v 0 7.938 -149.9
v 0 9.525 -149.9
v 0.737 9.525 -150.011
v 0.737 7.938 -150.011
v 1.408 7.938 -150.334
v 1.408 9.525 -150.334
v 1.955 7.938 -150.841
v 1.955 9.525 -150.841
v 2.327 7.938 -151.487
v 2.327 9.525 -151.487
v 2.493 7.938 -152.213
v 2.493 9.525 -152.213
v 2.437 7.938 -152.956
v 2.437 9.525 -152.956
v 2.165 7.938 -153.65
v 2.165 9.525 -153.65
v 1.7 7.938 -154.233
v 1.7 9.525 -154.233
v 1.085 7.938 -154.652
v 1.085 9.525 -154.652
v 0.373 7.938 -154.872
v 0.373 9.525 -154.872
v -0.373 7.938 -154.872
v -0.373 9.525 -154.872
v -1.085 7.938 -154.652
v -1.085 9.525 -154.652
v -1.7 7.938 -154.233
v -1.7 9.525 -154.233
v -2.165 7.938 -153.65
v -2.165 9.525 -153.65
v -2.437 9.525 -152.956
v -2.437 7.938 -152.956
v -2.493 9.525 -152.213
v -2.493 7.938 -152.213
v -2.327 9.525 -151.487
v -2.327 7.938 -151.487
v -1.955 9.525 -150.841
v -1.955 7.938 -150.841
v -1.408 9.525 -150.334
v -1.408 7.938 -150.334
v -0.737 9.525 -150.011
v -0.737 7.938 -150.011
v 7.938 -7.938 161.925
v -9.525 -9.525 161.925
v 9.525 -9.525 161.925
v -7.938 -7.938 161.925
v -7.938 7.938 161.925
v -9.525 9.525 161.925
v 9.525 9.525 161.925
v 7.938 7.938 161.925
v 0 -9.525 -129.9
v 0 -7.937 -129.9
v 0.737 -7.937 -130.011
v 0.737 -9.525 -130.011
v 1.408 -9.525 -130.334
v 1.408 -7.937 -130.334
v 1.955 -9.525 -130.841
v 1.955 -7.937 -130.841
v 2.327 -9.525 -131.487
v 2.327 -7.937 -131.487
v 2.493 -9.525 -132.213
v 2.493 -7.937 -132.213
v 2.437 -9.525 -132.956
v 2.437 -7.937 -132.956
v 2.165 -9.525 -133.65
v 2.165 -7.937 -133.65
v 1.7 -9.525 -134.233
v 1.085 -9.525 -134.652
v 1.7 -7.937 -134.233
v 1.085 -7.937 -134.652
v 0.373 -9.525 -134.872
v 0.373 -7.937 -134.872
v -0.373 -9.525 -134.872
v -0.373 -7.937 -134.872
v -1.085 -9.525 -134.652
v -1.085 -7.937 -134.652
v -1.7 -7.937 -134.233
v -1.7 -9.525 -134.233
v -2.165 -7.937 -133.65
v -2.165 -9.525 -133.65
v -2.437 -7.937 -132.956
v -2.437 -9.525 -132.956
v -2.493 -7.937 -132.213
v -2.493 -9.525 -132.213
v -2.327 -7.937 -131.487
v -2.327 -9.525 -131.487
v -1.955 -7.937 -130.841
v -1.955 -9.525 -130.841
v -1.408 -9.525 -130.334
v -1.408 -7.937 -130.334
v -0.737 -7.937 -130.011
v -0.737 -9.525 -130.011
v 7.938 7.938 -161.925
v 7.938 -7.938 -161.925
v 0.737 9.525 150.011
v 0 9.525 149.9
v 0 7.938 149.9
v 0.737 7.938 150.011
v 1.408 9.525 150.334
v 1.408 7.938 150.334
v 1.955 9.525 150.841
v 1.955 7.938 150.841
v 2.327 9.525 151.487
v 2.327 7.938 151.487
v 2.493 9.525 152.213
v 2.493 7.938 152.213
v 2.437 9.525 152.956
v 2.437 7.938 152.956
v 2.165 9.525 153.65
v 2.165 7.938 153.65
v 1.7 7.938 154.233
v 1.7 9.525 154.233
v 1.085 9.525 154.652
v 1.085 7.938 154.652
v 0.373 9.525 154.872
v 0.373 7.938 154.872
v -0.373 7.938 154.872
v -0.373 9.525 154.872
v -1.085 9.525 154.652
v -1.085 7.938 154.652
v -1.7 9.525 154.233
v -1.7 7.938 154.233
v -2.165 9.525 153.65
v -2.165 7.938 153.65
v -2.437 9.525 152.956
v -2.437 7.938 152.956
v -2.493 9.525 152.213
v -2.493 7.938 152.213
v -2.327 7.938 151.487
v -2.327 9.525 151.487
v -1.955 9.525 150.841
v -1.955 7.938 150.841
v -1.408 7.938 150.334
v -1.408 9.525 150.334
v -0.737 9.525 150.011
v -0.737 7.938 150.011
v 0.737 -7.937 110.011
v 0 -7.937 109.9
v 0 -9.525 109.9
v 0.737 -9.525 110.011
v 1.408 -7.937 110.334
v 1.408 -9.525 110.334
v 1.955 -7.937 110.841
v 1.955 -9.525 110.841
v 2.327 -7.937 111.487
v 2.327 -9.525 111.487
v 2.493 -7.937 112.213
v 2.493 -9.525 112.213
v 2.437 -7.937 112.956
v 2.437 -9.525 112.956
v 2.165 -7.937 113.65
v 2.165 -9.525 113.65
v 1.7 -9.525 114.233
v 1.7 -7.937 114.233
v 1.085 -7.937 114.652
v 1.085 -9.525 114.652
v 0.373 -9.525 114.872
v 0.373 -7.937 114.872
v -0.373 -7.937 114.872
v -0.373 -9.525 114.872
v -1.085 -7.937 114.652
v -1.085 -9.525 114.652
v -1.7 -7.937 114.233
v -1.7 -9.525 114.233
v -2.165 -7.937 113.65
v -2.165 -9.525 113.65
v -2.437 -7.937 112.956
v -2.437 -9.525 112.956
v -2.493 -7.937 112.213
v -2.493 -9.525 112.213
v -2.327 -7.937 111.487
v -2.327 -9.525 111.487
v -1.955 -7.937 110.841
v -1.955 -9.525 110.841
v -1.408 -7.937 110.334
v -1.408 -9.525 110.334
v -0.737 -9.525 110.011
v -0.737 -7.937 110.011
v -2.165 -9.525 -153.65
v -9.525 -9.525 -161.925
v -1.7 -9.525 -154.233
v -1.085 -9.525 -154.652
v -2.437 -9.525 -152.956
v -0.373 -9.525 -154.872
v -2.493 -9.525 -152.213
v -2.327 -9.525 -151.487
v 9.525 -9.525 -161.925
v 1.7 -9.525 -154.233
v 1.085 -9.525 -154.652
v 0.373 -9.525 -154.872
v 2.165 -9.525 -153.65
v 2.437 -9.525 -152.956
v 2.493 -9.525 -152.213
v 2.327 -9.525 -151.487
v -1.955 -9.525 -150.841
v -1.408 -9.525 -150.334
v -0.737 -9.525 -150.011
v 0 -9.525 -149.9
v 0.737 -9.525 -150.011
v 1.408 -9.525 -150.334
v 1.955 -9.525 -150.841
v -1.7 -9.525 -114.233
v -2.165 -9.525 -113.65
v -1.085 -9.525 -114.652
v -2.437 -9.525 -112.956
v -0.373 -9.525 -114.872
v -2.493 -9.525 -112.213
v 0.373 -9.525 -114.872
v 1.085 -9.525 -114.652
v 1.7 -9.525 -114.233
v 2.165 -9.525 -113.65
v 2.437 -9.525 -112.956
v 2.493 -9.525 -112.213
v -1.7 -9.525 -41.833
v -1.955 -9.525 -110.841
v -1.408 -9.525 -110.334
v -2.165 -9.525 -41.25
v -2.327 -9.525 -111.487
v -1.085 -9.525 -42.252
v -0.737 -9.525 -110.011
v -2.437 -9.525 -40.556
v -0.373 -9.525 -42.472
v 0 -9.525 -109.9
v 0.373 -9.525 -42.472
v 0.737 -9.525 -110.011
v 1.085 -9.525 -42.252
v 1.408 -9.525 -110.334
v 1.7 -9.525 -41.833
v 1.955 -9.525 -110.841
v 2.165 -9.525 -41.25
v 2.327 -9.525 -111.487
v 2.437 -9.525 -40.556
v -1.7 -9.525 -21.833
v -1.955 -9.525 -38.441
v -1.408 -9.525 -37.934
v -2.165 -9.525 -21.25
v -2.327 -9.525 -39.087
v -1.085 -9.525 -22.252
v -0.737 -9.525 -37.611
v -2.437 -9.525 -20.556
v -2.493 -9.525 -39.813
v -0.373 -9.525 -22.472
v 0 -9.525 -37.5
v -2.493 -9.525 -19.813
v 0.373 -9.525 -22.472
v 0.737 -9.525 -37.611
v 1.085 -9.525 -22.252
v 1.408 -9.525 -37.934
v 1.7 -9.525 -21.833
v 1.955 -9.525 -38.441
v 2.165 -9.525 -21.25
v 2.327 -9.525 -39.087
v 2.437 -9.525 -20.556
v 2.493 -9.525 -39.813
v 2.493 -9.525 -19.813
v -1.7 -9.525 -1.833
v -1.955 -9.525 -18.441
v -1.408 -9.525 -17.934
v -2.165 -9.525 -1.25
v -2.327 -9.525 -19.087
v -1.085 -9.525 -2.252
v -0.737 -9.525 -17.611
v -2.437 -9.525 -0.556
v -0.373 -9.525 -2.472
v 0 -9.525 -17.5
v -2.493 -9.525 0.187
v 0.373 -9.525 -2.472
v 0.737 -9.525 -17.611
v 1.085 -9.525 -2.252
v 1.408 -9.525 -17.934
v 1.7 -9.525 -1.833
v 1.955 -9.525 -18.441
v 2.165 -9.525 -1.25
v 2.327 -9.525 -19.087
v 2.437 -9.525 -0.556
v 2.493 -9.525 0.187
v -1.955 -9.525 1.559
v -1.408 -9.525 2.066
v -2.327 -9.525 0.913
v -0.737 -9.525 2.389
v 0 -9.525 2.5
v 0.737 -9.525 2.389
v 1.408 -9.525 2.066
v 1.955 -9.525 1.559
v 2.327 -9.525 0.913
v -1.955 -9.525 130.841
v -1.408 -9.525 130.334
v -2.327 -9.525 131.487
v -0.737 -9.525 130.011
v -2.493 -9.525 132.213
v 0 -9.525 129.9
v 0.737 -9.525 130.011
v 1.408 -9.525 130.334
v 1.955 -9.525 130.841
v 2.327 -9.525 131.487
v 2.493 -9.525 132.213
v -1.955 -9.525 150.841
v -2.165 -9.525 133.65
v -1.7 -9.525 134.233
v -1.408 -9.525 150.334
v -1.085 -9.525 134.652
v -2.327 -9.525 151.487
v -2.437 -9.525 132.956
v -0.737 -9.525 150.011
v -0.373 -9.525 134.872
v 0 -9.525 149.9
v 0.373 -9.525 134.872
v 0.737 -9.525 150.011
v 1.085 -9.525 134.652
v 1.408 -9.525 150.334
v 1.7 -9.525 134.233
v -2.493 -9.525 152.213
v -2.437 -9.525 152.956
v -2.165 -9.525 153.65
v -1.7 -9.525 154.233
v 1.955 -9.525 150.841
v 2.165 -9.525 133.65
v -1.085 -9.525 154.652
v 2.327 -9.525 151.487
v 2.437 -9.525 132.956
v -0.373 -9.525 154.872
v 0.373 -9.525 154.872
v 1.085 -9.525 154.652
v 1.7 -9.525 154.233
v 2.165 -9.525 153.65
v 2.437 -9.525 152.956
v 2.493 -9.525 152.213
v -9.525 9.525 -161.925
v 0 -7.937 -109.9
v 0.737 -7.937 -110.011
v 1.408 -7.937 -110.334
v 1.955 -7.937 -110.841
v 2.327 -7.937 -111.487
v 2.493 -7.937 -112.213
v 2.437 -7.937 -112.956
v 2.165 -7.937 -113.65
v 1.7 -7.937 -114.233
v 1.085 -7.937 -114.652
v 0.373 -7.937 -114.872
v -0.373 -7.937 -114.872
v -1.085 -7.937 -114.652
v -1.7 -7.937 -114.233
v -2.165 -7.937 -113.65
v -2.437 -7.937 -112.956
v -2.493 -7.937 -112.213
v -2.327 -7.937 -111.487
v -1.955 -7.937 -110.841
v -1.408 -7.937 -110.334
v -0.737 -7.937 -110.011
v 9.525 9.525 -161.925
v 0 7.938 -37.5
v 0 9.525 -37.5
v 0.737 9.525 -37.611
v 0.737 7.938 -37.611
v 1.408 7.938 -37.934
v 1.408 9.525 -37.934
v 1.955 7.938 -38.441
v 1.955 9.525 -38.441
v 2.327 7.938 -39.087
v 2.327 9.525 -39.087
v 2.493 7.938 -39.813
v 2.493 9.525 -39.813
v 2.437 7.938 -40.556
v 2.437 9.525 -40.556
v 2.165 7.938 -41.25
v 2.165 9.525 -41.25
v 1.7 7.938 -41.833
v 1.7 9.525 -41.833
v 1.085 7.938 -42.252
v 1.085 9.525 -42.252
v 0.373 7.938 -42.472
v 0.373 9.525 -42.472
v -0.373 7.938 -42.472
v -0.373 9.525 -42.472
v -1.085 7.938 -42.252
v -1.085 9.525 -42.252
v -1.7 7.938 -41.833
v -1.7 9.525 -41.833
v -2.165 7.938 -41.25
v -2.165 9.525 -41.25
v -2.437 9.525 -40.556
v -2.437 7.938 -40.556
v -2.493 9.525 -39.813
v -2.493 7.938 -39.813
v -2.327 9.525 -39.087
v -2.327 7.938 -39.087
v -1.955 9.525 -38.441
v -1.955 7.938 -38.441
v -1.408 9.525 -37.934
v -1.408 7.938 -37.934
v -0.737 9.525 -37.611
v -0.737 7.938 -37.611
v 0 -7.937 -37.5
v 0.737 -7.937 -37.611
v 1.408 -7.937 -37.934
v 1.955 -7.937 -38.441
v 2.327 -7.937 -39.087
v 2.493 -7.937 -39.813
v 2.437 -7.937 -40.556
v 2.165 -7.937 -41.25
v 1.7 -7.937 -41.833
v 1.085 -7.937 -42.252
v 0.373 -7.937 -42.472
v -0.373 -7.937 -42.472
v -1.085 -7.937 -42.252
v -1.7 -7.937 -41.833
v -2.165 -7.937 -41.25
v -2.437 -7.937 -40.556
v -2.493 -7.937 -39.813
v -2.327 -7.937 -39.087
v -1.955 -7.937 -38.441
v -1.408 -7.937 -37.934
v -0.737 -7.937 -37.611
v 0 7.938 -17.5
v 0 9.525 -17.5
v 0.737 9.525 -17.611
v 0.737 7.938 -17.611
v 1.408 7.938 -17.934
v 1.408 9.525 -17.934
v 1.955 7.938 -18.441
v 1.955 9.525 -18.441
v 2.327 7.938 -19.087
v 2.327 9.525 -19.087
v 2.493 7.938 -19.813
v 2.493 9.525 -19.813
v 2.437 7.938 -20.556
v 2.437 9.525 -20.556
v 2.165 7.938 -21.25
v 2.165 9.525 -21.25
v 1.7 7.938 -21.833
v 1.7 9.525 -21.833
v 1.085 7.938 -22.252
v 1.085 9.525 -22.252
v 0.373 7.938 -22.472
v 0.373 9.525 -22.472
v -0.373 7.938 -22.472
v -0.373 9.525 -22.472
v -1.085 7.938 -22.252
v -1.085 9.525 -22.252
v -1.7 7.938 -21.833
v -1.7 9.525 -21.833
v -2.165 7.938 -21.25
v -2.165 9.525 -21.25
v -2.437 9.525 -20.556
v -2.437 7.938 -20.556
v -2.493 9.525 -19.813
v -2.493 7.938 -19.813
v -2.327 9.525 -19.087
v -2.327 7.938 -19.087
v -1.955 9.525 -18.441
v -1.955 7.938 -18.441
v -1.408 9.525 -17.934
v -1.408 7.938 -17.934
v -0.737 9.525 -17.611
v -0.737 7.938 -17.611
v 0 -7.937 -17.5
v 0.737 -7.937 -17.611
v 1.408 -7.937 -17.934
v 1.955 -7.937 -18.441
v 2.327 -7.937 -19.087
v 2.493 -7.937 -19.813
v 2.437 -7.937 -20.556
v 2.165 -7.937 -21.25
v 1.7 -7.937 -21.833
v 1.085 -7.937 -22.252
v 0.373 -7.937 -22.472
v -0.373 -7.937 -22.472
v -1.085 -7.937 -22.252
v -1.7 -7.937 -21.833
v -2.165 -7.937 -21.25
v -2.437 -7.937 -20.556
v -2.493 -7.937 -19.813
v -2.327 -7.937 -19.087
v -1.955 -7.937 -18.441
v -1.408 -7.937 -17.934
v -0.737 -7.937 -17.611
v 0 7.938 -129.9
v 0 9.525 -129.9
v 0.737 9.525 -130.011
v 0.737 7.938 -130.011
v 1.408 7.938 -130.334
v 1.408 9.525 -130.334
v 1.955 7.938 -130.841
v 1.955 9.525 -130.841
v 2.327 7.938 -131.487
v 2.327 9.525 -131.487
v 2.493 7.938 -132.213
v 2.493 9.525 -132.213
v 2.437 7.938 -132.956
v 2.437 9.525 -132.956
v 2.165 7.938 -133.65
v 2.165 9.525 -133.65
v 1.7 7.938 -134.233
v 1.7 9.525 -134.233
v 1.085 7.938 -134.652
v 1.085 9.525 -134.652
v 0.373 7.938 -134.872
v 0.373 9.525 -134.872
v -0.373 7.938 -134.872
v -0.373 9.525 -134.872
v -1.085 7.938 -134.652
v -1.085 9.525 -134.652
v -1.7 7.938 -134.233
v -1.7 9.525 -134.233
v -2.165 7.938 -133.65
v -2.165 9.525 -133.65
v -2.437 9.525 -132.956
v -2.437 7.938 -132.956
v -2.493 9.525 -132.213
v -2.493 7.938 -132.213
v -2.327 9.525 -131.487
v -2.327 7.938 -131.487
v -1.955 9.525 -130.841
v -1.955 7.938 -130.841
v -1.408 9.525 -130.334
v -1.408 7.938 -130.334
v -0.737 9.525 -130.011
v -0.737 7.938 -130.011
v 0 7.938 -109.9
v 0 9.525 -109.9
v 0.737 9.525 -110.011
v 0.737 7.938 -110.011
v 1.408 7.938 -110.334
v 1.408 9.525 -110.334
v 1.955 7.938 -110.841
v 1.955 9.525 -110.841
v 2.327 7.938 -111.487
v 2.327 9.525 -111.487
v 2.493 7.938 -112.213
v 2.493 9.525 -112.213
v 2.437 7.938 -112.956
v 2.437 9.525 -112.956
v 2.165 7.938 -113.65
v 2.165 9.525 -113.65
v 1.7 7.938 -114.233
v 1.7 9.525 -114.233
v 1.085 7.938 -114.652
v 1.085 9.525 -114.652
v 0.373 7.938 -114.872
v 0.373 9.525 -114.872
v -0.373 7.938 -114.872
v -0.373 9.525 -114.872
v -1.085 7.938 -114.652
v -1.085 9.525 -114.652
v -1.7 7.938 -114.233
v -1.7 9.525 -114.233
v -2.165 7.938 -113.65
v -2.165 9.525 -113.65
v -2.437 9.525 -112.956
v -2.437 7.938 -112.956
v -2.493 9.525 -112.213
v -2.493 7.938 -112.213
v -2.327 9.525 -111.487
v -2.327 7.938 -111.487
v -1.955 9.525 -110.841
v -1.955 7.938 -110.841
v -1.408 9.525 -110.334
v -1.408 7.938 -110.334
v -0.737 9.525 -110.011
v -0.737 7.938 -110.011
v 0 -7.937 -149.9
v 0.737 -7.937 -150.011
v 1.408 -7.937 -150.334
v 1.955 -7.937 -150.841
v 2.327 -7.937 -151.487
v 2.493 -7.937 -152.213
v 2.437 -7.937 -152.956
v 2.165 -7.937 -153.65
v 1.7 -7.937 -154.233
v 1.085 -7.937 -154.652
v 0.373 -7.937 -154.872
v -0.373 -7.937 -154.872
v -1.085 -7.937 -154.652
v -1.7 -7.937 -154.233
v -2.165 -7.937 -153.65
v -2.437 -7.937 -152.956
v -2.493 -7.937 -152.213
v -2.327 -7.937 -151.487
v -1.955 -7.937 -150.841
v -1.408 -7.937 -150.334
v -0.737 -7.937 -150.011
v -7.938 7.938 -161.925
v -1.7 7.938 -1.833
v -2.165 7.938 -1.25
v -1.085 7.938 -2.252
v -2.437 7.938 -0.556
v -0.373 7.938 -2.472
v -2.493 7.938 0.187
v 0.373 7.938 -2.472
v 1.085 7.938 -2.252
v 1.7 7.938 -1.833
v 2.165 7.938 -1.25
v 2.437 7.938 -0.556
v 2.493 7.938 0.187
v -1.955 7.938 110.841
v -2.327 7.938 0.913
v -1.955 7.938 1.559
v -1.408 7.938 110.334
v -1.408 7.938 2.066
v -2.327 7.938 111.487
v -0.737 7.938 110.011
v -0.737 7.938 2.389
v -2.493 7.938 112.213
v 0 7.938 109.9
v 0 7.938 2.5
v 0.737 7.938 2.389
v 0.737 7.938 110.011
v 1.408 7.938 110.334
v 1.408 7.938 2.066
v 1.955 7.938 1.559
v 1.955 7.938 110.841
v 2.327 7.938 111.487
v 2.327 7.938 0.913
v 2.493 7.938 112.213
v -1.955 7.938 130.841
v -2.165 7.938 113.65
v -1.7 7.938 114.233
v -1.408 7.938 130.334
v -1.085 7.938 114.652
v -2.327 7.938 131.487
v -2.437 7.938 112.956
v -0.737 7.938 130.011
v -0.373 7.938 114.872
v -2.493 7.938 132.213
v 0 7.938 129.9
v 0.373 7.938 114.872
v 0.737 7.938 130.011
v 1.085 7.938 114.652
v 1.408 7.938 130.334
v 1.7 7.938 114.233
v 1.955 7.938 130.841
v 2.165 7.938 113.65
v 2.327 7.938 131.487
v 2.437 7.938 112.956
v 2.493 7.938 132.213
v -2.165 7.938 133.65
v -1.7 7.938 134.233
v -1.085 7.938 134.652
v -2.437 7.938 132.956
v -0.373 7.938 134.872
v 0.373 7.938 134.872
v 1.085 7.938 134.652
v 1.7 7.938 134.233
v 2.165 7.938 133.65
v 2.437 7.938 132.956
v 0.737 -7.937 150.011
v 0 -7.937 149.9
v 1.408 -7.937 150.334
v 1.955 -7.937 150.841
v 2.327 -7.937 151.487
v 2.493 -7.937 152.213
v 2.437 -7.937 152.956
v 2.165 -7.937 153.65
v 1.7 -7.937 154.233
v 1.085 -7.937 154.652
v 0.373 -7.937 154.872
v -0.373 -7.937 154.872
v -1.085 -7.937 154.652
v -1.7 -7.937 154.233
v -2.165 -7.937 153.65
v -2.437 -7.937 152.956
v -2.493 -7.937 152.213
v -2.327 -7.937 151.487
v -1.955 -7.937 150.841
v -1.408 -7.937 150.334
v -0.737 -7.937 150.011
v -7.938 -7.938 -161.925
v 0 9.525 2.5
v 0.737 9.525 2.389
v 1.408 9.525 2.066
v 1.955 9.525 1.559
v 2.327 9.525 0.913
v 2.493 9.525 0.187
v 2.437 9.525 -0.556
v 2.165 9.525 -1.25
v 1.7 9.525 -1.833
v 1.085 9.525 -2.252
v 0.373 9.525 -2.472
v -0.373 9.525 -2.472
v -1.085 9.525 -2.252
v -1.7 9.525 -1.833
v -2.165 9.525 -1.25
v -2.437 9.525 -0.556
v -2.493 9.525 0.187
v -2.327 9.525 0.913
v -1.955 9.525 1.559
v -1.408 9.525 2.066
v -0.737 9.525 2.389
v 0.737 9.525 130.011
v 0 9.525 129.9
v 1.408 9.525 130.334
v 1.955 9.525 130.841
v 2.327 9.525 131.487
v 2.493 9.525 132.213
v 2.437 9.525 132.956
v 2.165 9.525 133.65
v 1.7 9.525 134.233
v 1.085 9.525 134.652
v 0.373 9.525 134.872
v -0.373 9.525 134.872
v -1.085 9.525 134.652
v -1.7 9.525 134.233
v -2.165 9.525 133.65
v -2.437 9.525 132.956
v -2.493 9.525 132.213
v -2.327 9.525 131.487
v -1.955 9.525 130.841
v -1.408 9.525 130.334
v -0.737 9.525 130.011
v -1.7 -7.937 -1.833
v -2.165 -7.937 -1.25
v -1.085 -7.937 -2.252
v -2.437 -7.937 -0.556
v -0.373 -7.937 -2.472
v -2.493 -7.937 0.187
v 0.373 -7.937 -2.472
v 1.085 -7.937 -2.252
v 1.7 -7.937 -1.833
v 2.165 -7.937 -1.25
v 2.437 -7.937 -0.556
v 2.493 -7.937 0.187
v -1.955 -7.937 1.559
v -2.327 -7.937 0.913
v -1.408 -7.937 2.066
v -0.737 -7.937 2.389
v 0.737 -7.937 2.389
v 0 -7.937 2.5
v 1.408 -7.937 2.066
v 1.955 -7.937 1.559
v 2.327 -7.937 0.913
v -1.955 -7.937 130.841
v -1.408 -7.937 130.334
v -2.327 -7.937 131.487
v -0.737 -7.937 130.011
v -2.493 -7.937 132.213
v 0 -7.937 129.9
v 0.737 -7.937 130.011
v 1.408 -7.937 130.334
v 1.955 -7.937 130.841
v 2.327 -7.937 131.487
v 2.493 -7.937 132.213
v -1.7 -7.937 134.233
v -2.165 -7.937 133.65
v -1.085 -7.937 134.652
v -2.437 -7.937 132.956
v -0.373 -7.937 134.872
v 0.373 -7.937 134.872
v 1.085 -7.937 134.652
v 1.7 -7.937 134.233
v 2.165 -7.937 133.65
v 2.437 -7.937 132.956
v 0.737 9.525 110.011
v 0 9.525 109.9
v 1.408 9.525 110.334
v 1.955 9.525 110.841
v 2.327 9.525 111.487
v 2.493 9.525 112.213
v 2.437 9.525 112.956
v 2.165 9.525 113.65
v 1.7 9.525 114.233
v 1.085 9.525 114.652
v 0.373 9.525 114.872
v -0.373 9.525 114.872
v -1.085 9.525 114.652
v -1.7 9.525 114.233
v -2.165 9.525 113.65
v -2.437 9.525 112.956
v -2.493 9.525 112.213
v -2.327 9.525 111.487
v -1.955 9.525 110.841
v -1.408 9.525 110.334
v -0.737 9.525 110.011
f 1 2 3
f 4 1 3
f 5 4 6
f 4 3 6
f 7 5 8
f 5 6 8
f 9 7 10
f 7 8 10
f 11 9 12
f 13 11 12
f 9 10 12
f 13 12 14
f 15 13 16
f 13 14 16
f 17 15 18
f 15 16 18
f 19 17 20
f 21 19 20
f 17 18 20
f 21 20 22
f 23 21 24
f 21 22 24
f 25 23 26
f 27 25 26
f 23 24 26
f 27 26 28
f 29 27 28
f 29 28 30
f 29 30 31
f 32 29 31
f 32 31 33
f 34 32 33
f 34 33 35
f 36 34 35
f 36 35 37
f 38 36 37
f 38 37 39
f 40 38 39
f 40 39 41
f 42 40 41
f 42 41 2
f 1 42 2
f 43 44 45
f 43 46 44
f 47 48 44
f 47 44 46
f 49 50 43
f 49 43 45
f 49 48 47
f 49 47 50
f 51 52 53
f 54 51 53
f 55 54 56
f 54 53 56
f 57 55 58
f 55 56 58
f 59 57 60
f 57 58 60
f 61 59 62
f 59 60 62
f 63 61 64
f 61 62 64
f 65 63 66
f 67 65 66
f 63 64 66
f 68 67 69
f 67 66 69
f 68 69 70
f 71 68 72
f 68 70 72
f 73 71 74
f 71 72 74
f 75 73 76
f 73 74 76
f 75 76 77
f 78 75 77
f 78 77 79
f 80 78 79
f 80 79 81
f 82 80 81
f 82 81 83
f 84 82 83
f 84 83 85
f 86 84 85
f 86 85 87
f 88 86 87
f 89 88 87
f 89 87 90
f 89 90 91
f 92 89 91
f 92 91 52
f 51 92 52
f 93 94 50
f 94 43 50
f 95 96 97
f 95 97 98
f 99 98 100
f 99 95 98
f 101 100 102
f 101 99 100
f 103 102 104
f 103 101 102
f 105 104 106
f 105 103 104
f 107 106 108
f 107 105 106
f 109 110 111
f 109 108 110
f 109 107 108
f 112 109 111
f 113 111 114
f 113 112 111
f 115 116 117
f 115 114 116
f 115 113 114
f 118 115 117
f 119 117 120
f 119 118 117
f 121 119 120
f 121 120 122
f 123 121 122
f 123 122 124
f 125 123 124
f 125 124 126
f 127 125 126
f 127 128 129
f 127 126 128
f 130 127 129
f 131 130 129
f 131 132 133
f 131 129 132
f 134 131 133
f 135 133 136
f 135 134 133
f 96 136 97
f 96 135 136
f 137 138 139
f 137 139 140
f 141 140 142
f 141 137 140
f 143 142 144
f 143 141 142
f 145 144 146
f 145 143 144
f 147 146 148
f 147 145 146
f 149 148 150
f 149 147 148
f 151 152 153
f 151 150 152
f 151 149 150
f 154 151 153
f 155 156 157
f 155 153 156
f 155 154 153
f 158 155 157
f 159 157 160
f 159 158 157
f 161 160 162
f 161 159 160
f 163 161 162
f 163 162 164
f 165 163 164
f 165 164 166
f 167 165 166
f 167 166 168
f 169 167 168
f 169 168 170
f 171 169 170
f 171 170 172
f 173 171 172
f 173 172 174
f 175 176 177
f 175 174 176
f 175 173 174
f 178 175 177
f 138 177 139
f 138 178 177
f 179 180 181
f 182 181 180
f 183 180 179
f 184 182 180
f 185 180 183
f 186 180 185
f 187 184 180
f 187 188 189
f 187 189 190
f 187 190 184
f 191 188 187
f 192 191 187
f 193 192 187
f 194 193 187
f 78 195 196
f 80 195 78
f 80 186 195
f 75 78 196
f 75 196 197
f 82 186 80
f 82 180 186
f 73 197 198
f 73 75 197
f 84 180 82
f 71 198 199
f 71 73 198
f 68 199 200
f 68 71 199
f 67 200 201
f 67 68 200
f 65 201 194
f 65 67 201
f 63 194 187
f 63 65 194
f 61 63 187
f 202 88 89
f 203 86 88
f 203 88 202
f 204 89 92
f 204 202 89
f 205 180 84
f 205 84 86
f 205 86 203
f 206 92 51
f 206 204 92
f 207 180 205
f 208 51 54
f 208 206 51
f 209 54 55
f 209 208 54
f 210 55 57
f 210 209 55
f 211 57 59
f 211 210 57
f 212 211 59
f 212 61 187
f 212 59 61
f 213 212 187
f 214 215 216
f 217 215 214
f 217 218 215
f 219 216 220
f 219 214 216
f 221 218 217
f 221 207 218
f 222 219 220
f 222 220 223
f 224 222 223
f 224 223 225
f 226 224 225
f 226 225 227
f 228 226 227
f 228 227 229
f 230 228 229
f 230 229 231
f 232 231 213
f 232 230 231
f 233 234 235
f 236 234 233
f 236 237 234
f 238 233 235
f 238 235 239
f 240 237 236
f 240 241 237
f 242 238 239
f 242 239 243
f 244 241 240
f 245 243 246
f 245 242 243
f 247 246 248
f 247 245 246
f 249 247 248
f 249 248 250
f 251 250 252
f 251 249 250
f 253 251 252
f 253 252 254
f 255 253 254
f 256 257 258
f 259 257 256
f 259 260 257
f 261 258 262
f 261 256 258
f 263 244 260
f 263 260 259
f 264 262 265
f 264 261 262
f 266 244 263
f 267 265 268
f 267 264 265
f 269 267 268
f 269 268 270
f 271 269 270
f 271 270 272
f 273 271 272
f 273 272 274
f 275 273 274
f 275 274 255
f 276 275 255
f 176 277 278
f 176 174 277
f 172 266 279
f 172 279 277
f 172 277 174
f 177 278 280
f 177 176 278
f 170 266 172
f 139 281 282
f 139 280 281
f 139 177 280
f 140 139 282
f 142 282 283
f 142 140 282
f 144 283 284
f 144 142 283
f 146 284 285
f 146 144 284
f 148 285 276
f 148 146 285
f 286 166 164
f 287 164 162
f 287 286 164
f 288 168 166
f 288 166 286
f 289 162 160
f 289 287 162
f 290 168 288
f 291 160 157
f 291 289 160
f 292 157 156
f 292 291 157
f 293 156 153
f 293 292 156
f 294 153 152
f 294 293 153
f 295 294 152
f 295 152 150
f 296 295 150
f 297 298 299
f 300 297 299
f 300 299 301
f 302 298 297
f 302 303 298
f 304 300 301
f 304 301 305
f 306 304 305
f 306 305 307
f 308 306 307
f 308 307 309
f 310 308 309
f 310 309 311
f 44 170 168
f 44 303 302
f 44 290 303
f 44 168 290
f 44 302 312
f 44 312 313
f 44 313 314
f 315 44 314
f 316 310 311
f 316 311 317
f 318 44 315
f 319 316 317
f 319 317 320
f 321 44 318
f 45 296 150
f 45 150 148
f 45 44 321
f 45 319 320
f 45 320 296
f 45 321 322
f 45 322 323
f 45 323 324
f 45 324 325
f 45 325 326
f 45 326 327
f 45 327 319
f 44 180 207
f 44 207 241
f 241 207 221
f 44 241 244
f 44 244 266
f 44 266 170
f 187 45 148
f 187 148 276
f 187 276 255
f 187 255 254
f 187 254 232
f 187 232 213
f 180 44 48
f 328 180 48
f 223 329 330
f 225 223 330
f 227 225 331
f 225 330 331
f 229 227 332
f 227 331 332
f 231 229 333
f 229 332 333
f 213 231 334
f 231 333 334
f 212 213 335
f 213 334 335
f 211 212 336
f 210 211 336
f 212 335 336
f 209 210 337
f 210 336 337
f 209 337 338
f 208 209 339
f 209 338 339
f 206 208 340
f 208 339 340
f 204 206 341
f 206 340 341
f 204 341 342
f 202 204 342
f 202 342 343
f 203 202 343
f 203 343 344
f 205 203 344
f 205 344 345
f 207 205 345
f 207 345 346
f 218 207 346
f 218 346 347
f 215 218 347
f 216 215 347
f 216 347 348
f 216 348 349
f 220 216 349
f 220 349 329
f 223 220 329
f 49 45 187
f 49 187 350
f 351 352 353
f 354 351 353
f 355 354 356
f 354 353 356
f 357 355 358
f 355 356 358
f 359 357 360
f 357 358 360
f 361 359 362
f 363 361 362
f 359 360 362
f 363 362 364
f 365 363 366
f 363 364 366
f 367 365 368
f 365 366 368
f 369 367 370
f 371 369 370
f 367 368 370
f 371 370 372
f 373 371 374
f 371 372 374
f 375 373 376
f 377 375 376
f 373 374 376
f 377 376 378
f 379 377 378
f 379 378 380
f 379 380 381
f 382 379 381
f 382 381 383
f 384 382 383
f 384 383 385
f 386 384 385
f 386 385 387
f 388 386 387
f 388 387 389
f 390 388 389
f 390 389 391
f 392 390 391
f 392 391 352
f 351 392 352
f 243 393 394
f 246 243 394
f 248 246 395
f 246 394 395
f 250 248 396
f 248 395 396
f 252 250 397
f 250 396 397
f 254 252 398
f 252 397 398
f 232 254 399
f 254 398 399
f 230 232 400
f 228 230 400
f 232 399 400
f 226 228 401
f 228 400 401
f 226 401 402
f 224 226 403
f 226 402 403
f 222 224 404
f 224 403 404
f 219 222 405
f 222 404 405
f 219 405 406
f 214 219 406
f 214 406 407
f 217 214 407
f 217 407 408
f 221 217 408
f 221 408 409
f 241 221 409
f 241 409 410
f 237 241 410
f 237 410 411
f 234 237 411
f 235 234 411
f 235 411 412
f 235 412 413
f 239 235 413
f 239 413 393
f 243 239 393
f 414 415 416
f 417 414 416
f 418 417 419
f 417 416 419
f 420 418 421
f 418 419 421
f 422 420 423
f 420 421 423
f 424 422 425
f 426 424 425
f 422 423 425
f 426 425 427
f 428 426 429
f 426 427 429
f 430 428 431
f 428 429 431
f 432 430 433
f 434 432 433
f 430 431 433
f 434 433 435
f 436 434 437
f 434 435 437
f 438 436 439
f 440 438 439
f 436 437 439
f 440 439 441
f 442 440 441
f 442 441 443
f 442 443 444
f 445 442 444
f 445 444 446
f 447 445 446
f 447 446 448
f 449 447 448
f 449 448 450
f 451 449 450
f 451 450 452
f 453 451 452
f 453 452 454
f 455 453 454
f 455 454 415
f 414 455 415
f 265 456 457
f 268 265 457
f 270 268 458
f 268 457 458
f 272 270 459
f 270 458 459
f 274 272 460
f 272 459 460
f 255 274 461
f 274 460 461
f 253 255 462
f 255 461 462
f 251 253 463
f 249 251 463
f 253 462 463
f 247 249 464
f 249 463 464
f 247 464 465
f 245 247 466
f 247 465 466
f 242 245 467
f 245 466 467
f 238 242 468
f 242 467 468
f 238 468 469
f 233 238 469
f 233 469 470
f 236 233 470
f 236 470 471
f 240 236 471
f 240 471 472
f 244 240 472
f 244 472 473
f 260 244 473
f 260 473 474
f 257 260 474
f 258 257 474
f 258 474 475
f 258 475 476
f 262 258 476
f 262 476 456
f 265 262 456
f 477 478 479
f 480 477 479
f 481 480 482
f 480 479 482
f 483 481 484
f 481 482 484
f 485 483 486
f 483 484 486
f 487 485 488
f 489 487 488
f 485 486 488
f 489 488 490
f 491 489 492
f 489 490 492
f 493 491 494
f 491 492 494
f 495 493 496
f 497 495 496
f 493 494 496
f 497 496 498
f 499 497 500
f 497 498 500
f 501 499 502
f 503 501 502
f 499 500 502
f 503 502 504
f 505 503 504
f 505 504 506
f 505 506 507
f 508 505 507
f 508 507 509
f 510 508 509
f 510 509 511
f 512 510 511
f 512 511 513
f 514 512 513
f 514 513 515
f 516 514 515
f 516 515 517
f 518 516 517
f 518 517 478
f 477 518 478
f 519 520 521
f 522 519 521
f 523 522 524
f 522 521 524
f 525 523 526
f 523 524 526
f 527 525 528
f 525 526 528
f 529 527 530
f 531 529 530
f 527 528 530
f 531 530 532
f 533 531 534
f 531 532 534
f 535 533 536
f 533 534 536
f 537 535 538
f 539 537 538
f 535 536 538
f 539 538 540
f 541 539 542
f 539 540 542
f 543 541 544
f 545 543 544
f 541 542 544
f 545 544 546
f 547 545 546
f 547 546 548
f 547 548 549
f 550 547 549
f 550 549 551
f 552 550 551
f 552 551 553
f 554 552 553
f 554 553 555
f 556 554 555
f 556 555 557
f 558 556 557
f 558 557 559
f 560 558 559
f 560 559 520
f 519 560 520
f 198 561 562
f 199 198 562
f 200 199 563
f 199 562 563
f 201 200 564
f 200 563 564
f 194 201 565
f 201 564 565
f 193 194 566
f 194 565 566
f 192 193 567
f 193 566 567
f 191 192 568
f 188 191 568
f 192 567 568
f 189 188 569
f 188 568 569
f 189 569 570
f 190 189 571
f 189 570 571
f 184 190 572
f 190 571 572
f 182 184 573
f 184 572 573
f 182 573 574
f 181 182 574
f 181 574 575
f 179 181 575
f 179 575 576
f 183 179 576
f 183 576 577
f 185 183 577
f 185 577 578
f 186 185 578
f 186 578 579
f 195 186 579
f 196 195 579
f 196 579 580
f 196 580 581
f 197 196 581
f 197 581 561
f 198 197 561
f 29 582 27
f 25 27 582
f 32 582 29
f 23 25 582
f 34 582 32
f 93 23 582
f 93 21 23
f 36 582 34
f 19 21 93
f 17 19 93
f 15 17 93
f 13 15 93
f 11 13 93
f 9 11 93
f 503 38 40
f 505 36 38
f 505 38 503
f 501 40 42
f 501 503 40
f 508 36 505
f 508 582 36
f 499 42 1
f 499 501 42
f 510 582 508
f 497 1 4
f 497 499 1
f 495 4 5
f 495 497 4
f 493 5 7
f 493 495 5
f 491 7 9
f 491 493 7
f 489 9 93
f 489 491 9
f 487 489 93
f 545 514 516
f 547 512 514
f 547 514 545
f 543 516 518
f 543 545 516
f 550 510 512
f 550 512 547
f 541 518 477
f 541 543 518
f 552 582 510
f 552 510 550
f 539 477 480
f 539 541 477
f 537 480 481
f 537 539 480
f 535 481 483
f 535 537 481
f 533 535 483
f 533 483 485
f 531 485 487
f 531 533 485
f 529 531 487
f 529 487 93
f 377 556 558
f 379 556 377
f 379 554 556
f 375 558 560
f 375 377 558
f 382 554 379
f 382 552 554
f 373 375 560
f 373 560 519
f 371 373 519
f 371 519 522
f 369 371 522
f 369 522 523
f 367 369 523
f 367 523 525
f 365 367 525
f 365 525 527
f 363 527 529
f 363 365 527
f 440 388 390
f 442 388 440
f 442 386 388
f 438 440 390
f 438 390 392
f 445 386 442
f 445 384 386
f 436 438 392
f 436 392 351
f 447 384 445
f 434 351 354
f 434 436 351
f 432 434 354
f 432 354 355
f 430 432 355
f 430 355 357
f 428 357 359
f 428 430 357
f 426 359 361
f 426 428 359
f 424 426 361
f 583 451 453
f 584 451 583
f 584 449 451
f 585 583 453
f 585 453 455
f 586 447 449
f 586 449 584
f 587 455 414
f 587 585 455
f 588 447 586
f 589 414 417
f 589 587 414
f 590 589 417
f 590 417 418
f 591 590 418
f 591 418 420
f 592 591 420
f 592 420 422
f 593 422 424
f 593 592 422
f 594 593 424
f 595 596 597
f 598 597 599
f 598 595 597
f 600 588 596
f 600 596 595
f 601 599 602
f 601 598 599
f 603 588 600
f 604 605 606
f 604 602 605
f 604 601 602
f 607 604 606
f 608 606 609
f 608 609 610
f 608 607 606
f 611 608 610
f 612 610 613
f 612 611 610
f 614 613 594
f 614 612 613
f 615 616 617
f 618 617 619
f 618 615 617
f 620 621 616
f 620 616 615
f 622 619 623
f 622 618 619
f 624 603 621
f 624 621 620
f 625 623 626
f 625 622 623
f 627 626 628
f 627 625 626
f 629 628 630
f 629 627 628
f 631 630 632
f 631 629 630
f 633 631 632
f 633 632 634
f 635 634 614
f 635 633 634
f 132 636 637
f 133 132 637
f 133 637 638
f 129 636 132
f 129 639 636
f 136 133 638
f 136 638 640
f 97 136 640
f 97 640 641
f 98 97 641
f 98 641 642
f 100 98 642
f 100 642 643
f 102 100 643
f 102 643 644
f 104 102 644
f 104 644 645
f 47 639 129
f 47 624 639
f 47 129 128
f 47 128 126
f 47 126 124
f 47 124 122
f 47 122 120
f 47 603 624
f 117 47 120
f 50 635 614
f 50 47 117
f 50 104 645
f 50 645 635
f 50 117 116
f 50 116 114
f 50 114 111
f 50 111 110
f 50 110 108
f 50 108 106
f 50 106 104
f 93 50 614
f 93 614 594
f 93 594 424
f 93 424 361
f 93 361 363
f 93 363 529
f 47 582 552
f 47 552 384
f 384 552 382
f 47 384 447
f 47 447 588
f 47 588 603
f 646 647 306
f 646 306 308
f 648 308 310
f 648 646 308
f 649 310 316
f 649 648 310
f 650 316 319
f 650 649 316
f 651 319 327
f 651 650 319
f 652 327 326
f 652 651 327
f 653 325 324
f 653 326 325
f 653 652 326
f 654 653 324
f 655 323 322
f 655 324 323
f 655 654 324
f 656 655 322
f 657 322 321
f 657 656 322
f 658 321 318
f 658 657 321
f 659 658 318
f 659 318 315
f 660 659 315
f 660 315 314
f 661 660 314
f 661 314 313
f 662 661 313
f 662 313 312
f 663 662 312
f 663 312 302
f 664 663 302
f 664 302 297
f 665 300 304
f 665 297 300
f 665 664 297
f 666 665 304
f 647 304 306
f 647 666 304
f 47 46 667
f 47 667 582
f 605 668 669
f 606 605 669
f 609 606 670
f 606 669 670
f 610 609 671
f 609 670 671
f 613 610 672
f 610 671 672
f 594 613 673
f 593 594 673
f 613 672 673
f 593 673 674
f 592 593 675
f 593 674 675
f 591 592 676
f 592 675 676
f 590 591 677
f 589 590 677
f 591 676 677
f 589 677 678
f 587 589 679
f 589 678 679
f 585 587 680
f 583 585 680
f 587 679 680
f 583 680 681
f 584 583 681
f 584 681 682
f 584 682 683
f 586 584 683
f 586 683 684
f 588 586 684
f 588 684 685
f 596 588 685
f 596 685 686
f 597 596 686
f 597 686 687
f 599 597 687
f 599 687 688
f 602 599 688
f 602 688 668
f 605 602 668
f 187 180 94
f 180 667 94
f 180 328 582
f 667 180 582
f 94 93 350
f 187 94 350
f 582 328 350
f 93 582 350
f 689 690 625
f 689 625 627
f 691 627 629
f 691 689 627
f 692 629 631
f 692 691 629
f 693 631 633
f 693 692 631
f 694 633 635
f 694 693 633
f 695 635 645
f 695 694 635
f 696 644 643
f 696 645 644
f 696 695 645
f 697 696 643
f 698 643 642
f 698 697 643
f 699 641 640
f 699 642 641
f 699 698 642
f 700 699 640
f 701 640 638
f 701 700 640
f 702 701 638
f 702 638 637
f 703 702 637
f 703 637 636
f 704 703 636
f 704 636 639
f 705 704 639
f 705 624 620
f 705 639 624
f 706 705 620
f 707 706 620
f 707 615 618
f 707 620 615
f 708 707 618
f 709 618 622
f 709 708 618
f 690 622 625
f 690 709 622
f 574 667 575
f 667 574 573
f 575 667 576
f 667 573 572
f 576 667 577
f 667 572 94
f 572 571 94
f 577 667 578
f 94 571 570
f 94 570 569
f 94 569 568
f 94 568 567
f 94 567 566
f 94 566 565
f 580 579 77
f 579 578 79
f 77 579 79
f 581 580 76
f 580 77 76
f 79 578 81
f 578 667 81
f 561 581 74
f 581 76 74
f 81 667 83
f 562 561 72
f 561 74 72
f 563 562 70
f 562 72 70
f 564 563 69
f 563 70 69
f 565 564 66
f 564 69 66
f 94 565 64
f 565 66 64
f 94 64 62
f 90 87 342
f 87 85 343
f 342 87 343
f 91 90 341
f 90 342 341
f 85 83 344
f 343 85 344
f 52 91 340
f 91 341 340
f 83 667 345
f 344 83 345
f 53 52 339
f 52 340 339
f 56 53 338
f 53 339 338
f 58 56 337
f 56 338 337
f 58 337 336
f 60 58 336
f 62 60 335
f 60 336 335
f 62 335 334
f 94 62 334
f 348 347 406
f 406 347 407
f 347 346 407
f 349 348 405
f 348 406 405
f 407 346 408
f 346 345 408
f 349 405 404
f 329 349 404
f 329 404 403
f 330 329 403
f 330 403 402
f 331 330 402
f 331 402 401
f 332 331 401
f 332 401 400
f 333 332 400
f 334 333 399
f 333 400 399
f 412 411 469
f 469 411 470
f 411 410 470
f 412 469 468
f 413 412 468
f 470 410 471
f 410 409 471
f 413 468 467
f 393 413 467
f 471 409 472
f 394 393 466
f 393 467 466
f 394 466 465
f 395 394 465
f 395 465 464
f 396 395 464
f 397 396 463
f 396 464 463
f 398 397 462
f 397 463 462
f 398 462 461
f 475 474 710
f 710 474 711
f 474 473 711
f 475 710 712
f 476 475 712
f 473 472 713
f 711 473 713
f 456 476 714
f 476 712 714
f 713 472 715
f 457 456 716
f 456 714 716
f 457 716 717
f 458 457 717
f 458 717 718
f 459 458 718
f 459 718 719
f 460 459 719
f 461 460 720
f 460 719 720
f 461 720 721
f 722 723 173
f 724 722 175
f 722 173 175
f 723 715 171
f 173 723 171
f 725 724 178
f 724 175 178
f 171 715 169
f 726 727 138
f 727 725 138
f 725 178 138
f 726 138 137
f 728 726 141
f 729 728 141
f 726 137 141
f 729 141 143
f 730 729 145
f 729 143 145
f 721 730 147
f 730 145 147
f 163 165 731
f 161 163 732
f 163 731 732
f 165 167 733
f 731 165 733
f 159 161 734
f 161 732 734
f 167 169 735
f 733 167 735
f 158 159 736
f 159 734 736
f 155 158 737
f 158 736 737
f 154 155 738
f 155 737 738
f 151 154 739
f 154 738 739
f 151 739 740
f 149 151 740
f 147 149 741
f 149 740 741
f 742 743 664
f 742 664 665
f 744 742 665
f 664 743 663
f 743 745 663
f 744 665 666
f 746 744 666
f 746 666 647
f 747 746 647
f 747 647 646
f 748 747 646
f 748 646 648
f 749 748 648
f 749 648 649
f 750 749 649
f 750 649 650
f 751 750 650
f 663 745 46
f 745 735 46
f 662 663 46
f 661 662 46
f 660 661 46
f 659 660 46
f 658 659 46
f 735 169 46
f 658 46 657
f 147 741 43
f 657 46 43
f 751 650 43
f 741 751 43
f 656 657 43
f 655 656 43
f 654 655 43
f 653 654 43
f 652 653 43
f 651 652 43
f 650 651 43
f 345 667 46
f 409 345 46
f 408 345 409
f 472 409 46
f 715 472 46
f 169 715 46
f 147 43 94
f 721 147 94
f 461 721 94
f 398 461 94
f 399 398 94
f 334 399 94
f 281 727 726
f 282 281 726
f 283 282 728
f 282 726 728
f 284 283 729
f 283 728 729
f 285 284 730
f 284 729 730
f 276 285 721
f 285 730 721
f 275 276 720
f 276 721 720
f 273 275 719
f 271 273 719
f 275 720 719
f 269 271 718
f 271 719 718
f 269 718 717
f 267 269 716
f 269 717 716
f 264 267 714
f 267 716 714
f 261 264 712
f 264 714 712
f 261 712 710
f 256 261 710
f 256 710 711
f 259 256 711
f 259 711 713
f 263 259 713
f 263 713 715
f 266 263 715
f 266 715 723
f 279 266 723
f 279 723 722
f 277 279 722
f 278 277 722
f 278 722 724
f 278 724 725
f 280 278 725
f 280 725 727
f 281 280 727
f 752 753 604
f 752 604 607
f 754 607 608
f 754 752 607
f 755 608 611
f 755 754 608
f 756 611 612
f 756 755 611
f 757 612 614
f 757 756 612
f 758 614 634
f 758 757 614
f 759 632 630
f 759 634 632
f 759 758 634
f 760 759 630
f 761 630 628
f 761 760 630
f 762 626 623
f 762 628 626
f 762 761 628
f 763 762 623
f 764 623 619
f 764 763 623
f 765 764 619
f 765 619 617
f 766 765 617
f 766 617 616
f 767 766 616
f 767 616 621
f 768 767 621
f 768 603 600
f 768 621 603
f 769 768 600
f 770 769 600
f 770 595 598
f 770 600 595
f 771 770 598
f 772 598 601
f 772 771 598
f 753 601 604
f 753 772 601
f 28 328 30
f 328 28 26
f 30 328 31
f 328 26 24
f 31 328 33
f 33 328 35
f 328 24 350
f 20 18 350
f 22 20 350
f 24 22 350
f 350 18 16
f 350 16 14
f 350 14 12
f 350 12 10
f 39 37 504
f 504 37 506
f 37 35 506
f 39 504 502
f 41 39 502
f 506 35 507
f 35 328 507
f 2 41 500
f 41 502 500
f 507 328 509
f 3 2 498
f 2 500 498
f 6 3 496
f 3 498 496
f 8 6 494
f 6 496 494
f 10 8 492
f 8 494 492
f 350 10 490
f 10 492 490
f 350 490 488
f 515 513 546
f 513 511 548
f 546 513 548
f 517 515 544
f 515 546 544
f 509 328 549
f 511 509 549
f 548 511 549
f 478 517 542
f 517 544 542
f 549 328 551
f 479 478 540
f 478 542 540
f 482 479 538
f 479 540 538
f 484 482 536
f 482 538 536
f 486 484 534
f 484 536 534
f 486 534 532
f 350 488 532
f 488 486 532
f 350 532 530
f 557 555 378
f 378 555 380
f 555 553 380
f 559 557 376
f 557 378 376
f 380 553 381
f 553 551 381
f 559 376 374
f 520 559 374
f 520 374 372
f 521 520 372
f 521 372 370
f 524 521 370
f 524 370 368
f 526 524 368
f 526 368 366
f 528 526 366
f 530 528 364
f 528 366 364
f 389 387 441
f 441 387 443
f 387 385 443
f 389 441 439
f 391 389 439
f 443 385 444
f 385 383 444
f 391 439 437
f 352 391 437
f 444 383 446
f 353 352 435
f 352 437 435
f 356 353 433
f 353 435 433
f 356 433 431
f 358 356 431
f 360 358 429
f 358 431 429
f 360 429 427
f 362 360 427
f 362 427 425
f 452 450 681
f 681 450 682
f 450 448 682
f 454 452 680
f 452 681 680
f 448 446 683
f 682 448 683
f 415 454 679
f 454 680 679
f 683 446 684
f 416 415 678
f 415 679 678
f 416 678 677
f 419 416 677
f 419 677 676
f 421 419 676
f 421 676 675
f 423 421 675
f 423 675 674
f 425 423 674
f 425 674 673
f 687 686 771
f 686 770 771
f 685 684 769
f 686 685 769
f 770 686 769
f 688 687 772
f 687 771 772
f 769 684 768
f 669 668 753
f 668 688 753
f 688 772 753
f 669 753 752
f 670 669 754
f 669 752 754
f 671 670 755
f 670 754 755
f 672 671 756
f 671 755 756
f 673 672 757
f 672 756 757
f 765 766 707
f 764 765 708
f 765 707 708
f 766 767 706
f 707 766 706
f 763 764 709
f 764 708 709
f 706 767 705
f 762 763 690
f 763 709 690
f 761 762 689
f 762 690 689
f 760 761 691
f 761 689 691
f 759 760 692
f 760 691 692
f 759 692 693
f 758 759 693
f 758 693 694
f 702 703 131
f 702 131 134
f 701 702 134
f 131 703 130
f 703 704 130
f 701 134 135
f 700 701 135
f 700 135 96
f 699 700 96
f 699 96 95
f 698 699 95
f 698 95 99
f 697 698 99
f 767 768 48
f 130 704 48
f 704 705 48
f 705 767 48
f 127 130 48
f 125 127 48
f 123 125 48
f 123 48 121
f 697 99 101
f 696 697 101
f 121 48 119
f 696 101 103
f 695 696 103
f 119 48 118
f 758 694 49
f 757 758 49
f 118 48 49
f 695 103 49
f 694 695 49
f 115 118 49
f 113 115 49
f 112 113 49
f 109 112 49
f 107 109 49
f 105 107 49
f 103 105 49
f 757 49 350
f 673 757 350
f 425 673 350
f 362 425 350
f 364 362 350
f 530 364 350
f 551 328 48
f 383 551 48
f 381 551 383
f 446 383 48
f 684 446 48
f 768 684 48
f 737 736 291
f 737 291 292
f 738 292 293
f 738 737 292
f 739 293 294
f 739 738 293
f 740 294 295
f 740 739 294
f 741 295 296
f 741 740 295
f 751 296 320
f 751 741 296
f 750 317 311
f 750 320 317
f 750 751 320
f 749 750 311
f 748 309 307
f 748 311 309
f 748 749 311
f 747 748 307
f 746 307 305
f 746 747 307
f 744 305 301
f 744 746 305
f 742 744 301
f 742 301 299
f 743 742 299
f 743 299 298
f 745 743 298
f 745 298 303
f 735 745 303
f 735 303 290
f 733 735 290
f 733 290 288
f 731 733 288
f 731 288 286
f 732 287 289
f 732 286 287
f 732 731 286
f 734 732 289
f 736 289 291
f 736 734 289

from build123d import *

# Parameters (mm, degrees)
SKETCH1_W           = 19.05
SKETCH1_H           = 19.05
SKETCH1_W_2         = 15.875
SKETCH1_H_2         = 15.875
BOSS_EXTRUDE1_DEPTH = 161.925
SKETCH2_R           = 2.5
CUT_EXTRUDE1_DEPTH  = 30
SKETCH3_R           = 2.5
CUT_EXTRUDE2_DEPTH  = 30


with BuildPart() as part:
    # Sketch1 → Boss-Extrude1 (new, symmetric)
    with BuildSketch(Plane.XY):
        Rectangle(SKETCH1_W, SKETCH1_H)
        Rectangle(SKETCH1_W_2, SKETCH1_H_2, mode=Mode.SUBTRACT)
    extrude(amount=BOSS_EXTRUDE1_DEPTH, both=True)

    # Sketch2 → Cut-Extrude1 (cut)
    with BuildSketch(Plane(origin=(-206.375, 13.525, 0), x_dir=(0, 0, -1), z_dir=(0, 1, 0))):
        with Locations(Location((152.4, -206.375, 0), (0, 0, 180))):
            Circle(SKETCH2_R)
        with Locations(Location((132.4, -206.375, 0), (0, 0, 180))):
            Circle(SKETCH2_R)
        with Locations(Location((112.4, -206.375, 0), (0, 0, 180))):
            Circle(SKETCH2_R)
    cut_extrude1 = extrude(amount=-CUT_EXTRUDE1_DEPTH, mode=Mode.SUBTRACT)

    # Mirror1: Cut-Extrude1 across Front Plane
    add(cut_extrude1.mirror(Plane.XY), mode=Mode.SUBTRACT)

    # Sketch3 → Cut-Extrude2 (cut)
    with BuildSketch(Plane(origin=(-206.375, 13.525, 0), x_dir=(0, 0, -1), z_dir=(0, 1, 0))):
        with Locations(Location((0, -206.375, 0), (0, 0, 180))):
            Circle(SKETCH3_R)
        with Locations(Location((20, -206.375, 0), (0, 0, 180))):
            Circle(SKETCH3_R)
        with Locations(Location((40, -206.375, 0), (0, 0, 180))):
            Circle(SKETCH3_R)
    extrude(amount=-CUT_EXTRUDE2_DEPTH, mode=Mode.SUBTRACT)


solid = part.part
